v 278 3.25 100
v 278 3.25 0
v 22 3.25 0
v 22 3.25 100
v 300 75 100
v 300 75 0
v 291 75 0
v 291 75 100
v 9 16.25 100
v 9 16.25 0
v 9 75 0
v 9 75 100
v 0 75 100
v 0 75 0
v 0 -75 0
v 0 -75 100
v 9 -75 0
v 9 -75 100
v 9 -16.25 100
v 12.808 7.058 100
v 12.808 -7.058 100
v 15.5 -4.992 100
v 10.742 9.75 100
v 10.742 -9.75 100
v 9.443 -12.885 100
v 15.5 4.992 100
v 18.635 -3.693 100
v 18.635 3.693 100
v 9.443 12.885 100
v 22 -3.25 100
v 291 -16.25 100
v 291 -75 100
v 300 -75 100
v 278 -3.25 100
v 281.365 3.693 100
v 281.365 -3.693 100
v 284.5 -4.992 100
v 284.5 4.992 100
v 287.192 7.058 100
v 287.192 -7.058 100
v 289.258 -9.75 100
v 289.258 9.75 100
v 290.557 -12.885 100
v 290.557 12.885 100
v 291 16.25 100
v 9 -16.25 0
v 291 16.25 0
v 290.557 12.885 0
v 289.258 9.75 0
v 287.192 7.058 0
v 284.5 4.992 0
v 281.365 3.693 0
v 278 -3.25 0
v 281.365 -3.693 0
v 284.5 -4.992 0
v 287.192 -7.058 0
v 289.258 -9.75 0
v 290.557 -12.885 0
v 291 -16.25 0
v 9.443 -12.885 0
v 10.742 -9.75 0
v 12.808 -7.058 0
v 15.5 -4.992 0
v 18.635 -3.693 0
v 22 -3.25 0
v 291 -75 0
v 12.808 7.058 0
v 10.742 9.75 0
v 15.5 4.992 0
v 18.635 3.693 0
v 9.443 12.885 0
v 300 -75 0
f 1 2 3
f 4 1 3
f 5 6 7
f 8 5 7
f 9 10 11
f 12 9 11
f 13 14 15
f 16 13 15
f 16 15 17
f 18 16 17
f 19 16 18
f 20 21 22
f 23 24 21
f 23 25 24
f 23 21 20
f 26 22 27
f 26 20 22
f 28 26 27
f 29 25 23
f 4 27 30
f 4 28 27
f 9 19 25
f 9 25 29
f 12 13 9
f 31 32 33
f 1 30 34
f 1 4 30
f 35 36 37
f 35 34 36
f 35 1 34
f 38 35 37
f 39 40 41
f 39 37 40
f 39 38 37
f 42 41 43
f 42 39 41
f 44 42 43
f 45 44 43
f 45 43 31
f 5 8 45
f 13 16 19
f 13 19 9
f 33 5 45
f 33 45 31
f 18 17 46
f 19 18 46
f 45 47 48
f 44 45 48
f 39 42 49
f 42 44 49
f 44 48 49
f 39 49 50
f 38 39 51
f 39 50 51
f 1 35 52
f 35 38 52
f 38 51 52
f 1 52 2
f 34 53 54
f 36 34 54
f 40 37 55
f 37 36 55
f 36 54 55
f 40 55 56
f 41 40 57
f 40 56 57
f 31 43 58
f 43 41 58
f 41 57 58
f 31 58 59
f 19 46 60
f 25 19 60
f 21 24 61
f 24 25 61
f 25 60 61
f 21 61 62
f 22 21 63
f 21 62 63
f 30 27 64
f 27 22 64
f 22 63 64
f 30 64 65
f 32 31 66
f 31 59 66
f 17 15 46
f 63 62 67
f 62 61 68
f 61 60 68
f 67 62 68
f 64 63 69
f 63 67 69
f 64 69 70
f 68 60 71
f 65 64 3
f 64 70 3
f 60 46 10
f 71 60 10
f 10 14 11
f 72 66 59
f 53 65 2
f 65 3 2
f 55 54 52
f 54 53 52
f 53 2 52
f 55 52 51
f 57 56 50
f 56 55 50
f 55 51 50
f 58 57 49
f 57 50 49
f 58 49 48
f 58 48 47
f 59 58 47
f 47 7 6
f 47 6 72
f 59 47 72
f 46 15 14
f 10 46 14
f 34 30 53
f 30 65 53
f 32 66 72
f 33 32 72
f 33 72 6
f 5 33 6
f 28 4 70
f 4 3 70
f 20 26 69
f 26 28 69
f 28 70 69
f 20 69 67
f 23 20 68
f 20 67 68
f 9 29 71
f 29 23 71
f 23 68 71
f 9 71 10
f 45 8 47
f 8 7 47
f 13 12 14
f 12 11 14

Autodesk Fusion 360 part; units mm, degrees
sketch "スケッチ1" plane through (0, 0, 0) normal (0, 0, 1) x (1, 0, 0)
  line L0 (0, 75) -> (0, -75)
  line L1 (300, -75) -> (300, 75)
  line L2 (291, -16.25) -> (291, -75)
  line L3 (9, -75) -> (9, -16.25)
  line L4 (0, -75) -> (9, -75)
  line L5 (291, -75) -> (300, -75)
  line L6 (278, 3.25) -> (22, 3.25)
  line L7 (22, -3.25) -> (278, -3.25)
  line L8 (9, 16.25) -> (9, 75)
  arc A0 (22, -3.25) -> (9, -16.25) centre (22, -16.25) ccw
  arc A1 (9, 16.25) -> (22, 3.25) centre (22, 16.25) ccw
  line L9 (9, 75) -> (0, 75)
  line L10 (291, 75) -> (291, 16.25)
  arc A2 (291, -16.25) -> (278, -3.25) centre (278, -16.25) ccw
  arc A3 (278, 3.25) -> (291, 16.25) centre (278, 16.25) ccw
  line L11 (300, 75) -> (291, 75)
extrude "押し出し1" add sketch "スケッチ1" along normal blind 100
